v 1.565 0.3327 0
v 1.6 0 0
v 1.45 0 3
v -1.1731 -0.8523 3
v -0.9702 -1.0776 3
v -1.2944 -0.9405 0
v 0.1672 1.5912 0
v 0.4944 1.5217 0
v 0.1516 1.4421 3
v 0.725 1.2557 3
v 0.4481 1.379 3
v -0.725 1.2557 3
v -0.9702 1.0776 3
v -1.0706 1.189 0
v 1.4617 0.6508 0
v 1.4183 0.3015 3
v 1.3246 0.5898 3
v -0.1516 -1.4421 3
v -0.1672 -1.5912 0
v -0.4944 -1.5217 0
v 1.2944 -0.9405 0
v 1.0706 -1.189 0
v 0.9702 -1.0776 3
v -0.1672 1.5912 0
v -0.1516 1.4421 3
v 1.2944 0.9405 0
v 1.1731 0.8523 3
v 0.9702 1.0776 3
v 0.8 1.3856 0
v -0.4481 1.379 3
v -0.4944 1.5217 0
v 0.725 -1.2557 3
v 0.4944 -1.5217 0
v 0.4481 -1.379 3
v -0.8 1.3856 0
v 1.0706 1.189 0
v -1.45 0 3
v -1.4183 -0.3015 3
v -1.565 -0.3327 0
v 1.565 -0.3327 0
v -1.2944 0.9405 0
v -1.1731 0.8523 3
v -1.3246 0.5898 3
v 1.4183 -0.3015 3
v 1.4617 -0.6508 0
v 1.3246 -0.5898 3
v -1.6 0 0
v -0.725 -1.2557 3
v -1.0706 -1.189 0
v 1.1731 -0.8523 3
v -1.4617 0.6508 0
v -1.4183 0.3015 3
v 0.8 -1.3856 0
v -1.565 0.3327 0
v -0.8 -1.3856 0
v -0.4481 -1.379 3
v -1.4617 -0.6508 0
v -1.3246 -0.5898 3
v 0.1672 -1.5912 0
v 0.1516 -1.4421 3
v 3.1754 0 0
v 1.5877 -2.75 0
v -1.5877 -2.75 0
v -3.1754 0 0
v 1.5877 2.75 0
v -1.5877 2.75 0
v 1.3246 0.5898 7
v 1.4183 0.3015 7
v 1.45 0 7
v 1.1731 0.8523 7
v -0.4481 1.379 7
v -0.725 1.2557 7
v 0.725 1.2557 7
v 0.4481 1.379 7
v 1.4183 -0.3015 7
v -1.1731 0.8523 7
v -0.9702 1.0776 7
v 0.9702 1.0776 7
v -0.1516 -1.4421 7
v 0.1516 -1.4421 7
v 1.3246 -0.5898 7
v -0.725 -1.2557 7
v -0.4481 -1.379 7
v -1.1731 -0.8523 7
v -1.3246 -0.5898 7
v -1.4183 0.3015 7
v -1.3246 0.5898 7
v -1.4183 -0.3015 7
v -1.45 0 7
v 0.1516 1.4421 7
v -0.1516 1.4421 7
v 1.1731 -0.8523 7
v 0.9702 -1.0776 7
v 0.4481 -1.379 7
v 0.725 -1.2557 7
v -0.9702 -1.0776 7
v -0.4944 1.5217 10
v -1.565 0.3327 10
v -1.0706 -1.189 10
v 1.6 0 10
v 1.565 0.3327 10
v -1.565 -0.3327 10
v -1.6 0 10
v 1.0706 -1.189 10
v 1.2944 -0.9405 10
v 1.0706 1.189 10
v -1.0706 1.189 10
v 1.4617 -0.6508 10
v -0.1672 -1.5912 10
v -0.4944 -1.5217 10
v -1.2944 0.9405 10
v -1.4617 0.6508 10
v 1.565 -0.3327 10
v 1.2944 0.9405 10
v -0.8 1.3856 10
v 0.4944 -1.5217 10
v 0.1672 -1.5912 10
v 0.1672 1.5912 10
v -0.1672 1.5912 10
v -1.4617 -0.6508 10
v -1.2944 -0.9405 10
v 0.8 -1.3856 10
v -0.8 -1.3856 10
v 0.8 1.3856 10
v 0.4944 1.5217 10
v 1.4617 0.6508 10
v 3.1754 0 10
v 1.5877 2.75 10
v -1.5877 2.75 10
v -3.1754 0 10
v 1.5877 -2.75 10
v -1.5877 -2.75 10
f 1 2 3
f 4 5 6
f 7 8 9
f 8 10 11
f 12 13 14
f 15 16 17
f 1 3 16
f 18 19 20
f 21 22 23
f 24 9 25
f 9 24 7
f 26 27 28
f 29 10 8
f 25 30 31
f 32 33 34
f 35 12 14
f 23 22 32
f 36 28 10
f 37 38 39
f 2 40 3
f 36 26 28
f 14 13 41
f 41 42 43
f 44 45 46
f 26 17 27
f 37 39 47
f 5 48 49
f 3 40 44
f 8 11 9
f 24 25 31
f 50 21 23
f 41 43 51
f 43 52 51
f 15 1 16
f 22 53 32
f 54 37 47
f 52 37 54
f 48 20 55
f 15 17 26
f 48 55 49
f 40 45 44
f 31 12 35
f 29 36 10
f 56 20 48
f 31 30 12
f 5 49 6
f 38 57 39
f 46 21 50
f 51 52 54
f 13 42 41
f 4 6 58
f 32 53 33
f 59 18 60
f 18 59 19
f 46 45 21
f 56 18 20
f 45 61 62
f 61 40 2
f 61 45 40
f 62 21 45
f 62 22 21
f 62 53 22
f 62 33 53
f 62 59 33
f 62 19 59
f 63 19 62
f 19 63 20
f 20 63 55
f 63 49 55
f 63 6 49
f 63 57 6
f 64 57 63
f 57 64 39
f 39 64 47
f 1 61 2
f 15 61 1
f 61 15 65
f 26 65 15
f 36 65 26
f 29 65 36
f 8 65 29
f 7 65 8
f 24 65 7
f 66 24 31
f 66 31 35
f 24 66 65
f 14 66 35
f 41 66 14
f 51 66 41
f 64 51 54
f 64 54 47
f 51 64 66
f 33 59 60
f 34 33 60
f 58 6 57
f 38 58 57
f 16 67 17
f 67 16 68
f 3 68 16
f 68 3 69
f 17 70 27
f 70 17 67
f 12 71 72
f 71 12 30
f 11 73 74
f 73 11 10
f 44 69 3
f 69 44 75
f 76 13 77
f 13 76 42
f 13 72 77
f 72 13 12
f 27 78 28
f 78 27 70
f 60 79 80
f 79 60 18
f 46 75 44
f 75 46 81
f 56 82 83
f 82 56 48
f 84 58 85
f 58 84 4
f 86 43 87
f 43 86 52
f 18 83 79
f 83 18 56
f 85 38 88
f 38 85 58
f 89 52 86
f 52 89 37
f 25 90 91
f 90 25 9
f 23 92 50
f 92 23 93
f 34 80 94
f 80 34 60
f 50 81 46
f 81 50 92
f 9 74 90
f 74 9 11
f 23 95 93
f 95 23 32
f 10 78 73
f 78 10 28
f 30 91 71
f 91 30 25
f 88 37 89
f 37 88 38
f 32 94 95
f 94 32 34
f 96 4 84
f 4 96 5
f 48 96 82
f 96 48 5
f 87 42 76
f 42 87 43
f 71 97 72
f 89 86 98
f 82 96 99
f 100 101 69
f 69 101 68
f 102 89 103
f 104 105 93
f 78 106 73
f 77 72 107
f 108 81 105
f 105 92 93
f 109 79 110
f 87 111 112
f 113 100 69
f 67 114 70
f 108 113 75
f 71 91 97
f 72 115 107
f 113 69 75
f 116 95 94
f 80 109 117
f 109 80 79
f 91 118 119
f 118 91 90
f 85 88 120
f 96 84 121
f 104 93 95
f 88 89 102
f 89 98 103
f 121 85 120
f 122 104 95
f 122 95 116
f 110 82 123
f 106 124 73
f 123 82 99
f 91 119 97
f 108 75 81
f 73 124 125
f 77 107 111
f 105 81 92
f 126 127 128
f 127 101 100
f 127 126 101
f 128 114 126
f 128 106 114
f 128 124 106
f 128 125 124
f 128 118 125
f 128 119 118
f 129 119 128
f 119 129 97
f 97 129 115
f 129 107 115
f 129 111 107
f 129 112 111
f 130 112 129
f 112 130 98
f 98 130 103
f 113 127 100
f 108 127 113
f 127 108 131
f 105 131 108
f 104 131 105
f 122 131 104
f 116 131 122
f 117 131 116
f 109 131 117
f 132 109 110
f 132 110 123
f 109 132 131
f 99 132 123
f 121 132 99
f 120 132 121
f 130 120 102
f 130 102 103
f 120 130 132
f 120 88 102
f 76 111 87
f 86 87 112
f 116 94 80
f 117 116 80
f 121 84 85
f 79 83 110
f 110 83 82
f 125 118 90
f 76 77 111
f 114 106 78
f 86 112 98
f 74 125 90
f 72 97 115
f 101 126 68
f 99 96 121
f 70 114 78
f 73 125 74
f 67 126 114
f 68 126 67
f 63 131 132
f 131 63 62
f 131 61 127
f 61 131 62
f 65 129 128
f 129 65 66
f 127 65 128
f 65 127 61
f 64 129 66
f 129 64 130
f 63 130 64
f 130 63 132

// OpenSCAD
lenght=10;
entrance=3.2;
entrance_lenght=3;
hole=2.9;
$fn=30;
key=5.5;
key_circle=key*2/sqrt(3);




module hole(){
    
    cylinder(r1=entrance/2, r2=hole/2, h=entrance_lenght); 
    translate([0,0,entrance_lenght])cylinder(r=hole/2, h=lenght - 2*entrance_lenght);
    translate([0,0,lenght - entrance_lenght])cylinder(r2=entrance/2, r1=hole/2, h=entrance_lenght);
}

module base(){
    cylinder(r=key_circle/2,h=lenght,$fn=6);
}
difference(){
base();
hole();
}
